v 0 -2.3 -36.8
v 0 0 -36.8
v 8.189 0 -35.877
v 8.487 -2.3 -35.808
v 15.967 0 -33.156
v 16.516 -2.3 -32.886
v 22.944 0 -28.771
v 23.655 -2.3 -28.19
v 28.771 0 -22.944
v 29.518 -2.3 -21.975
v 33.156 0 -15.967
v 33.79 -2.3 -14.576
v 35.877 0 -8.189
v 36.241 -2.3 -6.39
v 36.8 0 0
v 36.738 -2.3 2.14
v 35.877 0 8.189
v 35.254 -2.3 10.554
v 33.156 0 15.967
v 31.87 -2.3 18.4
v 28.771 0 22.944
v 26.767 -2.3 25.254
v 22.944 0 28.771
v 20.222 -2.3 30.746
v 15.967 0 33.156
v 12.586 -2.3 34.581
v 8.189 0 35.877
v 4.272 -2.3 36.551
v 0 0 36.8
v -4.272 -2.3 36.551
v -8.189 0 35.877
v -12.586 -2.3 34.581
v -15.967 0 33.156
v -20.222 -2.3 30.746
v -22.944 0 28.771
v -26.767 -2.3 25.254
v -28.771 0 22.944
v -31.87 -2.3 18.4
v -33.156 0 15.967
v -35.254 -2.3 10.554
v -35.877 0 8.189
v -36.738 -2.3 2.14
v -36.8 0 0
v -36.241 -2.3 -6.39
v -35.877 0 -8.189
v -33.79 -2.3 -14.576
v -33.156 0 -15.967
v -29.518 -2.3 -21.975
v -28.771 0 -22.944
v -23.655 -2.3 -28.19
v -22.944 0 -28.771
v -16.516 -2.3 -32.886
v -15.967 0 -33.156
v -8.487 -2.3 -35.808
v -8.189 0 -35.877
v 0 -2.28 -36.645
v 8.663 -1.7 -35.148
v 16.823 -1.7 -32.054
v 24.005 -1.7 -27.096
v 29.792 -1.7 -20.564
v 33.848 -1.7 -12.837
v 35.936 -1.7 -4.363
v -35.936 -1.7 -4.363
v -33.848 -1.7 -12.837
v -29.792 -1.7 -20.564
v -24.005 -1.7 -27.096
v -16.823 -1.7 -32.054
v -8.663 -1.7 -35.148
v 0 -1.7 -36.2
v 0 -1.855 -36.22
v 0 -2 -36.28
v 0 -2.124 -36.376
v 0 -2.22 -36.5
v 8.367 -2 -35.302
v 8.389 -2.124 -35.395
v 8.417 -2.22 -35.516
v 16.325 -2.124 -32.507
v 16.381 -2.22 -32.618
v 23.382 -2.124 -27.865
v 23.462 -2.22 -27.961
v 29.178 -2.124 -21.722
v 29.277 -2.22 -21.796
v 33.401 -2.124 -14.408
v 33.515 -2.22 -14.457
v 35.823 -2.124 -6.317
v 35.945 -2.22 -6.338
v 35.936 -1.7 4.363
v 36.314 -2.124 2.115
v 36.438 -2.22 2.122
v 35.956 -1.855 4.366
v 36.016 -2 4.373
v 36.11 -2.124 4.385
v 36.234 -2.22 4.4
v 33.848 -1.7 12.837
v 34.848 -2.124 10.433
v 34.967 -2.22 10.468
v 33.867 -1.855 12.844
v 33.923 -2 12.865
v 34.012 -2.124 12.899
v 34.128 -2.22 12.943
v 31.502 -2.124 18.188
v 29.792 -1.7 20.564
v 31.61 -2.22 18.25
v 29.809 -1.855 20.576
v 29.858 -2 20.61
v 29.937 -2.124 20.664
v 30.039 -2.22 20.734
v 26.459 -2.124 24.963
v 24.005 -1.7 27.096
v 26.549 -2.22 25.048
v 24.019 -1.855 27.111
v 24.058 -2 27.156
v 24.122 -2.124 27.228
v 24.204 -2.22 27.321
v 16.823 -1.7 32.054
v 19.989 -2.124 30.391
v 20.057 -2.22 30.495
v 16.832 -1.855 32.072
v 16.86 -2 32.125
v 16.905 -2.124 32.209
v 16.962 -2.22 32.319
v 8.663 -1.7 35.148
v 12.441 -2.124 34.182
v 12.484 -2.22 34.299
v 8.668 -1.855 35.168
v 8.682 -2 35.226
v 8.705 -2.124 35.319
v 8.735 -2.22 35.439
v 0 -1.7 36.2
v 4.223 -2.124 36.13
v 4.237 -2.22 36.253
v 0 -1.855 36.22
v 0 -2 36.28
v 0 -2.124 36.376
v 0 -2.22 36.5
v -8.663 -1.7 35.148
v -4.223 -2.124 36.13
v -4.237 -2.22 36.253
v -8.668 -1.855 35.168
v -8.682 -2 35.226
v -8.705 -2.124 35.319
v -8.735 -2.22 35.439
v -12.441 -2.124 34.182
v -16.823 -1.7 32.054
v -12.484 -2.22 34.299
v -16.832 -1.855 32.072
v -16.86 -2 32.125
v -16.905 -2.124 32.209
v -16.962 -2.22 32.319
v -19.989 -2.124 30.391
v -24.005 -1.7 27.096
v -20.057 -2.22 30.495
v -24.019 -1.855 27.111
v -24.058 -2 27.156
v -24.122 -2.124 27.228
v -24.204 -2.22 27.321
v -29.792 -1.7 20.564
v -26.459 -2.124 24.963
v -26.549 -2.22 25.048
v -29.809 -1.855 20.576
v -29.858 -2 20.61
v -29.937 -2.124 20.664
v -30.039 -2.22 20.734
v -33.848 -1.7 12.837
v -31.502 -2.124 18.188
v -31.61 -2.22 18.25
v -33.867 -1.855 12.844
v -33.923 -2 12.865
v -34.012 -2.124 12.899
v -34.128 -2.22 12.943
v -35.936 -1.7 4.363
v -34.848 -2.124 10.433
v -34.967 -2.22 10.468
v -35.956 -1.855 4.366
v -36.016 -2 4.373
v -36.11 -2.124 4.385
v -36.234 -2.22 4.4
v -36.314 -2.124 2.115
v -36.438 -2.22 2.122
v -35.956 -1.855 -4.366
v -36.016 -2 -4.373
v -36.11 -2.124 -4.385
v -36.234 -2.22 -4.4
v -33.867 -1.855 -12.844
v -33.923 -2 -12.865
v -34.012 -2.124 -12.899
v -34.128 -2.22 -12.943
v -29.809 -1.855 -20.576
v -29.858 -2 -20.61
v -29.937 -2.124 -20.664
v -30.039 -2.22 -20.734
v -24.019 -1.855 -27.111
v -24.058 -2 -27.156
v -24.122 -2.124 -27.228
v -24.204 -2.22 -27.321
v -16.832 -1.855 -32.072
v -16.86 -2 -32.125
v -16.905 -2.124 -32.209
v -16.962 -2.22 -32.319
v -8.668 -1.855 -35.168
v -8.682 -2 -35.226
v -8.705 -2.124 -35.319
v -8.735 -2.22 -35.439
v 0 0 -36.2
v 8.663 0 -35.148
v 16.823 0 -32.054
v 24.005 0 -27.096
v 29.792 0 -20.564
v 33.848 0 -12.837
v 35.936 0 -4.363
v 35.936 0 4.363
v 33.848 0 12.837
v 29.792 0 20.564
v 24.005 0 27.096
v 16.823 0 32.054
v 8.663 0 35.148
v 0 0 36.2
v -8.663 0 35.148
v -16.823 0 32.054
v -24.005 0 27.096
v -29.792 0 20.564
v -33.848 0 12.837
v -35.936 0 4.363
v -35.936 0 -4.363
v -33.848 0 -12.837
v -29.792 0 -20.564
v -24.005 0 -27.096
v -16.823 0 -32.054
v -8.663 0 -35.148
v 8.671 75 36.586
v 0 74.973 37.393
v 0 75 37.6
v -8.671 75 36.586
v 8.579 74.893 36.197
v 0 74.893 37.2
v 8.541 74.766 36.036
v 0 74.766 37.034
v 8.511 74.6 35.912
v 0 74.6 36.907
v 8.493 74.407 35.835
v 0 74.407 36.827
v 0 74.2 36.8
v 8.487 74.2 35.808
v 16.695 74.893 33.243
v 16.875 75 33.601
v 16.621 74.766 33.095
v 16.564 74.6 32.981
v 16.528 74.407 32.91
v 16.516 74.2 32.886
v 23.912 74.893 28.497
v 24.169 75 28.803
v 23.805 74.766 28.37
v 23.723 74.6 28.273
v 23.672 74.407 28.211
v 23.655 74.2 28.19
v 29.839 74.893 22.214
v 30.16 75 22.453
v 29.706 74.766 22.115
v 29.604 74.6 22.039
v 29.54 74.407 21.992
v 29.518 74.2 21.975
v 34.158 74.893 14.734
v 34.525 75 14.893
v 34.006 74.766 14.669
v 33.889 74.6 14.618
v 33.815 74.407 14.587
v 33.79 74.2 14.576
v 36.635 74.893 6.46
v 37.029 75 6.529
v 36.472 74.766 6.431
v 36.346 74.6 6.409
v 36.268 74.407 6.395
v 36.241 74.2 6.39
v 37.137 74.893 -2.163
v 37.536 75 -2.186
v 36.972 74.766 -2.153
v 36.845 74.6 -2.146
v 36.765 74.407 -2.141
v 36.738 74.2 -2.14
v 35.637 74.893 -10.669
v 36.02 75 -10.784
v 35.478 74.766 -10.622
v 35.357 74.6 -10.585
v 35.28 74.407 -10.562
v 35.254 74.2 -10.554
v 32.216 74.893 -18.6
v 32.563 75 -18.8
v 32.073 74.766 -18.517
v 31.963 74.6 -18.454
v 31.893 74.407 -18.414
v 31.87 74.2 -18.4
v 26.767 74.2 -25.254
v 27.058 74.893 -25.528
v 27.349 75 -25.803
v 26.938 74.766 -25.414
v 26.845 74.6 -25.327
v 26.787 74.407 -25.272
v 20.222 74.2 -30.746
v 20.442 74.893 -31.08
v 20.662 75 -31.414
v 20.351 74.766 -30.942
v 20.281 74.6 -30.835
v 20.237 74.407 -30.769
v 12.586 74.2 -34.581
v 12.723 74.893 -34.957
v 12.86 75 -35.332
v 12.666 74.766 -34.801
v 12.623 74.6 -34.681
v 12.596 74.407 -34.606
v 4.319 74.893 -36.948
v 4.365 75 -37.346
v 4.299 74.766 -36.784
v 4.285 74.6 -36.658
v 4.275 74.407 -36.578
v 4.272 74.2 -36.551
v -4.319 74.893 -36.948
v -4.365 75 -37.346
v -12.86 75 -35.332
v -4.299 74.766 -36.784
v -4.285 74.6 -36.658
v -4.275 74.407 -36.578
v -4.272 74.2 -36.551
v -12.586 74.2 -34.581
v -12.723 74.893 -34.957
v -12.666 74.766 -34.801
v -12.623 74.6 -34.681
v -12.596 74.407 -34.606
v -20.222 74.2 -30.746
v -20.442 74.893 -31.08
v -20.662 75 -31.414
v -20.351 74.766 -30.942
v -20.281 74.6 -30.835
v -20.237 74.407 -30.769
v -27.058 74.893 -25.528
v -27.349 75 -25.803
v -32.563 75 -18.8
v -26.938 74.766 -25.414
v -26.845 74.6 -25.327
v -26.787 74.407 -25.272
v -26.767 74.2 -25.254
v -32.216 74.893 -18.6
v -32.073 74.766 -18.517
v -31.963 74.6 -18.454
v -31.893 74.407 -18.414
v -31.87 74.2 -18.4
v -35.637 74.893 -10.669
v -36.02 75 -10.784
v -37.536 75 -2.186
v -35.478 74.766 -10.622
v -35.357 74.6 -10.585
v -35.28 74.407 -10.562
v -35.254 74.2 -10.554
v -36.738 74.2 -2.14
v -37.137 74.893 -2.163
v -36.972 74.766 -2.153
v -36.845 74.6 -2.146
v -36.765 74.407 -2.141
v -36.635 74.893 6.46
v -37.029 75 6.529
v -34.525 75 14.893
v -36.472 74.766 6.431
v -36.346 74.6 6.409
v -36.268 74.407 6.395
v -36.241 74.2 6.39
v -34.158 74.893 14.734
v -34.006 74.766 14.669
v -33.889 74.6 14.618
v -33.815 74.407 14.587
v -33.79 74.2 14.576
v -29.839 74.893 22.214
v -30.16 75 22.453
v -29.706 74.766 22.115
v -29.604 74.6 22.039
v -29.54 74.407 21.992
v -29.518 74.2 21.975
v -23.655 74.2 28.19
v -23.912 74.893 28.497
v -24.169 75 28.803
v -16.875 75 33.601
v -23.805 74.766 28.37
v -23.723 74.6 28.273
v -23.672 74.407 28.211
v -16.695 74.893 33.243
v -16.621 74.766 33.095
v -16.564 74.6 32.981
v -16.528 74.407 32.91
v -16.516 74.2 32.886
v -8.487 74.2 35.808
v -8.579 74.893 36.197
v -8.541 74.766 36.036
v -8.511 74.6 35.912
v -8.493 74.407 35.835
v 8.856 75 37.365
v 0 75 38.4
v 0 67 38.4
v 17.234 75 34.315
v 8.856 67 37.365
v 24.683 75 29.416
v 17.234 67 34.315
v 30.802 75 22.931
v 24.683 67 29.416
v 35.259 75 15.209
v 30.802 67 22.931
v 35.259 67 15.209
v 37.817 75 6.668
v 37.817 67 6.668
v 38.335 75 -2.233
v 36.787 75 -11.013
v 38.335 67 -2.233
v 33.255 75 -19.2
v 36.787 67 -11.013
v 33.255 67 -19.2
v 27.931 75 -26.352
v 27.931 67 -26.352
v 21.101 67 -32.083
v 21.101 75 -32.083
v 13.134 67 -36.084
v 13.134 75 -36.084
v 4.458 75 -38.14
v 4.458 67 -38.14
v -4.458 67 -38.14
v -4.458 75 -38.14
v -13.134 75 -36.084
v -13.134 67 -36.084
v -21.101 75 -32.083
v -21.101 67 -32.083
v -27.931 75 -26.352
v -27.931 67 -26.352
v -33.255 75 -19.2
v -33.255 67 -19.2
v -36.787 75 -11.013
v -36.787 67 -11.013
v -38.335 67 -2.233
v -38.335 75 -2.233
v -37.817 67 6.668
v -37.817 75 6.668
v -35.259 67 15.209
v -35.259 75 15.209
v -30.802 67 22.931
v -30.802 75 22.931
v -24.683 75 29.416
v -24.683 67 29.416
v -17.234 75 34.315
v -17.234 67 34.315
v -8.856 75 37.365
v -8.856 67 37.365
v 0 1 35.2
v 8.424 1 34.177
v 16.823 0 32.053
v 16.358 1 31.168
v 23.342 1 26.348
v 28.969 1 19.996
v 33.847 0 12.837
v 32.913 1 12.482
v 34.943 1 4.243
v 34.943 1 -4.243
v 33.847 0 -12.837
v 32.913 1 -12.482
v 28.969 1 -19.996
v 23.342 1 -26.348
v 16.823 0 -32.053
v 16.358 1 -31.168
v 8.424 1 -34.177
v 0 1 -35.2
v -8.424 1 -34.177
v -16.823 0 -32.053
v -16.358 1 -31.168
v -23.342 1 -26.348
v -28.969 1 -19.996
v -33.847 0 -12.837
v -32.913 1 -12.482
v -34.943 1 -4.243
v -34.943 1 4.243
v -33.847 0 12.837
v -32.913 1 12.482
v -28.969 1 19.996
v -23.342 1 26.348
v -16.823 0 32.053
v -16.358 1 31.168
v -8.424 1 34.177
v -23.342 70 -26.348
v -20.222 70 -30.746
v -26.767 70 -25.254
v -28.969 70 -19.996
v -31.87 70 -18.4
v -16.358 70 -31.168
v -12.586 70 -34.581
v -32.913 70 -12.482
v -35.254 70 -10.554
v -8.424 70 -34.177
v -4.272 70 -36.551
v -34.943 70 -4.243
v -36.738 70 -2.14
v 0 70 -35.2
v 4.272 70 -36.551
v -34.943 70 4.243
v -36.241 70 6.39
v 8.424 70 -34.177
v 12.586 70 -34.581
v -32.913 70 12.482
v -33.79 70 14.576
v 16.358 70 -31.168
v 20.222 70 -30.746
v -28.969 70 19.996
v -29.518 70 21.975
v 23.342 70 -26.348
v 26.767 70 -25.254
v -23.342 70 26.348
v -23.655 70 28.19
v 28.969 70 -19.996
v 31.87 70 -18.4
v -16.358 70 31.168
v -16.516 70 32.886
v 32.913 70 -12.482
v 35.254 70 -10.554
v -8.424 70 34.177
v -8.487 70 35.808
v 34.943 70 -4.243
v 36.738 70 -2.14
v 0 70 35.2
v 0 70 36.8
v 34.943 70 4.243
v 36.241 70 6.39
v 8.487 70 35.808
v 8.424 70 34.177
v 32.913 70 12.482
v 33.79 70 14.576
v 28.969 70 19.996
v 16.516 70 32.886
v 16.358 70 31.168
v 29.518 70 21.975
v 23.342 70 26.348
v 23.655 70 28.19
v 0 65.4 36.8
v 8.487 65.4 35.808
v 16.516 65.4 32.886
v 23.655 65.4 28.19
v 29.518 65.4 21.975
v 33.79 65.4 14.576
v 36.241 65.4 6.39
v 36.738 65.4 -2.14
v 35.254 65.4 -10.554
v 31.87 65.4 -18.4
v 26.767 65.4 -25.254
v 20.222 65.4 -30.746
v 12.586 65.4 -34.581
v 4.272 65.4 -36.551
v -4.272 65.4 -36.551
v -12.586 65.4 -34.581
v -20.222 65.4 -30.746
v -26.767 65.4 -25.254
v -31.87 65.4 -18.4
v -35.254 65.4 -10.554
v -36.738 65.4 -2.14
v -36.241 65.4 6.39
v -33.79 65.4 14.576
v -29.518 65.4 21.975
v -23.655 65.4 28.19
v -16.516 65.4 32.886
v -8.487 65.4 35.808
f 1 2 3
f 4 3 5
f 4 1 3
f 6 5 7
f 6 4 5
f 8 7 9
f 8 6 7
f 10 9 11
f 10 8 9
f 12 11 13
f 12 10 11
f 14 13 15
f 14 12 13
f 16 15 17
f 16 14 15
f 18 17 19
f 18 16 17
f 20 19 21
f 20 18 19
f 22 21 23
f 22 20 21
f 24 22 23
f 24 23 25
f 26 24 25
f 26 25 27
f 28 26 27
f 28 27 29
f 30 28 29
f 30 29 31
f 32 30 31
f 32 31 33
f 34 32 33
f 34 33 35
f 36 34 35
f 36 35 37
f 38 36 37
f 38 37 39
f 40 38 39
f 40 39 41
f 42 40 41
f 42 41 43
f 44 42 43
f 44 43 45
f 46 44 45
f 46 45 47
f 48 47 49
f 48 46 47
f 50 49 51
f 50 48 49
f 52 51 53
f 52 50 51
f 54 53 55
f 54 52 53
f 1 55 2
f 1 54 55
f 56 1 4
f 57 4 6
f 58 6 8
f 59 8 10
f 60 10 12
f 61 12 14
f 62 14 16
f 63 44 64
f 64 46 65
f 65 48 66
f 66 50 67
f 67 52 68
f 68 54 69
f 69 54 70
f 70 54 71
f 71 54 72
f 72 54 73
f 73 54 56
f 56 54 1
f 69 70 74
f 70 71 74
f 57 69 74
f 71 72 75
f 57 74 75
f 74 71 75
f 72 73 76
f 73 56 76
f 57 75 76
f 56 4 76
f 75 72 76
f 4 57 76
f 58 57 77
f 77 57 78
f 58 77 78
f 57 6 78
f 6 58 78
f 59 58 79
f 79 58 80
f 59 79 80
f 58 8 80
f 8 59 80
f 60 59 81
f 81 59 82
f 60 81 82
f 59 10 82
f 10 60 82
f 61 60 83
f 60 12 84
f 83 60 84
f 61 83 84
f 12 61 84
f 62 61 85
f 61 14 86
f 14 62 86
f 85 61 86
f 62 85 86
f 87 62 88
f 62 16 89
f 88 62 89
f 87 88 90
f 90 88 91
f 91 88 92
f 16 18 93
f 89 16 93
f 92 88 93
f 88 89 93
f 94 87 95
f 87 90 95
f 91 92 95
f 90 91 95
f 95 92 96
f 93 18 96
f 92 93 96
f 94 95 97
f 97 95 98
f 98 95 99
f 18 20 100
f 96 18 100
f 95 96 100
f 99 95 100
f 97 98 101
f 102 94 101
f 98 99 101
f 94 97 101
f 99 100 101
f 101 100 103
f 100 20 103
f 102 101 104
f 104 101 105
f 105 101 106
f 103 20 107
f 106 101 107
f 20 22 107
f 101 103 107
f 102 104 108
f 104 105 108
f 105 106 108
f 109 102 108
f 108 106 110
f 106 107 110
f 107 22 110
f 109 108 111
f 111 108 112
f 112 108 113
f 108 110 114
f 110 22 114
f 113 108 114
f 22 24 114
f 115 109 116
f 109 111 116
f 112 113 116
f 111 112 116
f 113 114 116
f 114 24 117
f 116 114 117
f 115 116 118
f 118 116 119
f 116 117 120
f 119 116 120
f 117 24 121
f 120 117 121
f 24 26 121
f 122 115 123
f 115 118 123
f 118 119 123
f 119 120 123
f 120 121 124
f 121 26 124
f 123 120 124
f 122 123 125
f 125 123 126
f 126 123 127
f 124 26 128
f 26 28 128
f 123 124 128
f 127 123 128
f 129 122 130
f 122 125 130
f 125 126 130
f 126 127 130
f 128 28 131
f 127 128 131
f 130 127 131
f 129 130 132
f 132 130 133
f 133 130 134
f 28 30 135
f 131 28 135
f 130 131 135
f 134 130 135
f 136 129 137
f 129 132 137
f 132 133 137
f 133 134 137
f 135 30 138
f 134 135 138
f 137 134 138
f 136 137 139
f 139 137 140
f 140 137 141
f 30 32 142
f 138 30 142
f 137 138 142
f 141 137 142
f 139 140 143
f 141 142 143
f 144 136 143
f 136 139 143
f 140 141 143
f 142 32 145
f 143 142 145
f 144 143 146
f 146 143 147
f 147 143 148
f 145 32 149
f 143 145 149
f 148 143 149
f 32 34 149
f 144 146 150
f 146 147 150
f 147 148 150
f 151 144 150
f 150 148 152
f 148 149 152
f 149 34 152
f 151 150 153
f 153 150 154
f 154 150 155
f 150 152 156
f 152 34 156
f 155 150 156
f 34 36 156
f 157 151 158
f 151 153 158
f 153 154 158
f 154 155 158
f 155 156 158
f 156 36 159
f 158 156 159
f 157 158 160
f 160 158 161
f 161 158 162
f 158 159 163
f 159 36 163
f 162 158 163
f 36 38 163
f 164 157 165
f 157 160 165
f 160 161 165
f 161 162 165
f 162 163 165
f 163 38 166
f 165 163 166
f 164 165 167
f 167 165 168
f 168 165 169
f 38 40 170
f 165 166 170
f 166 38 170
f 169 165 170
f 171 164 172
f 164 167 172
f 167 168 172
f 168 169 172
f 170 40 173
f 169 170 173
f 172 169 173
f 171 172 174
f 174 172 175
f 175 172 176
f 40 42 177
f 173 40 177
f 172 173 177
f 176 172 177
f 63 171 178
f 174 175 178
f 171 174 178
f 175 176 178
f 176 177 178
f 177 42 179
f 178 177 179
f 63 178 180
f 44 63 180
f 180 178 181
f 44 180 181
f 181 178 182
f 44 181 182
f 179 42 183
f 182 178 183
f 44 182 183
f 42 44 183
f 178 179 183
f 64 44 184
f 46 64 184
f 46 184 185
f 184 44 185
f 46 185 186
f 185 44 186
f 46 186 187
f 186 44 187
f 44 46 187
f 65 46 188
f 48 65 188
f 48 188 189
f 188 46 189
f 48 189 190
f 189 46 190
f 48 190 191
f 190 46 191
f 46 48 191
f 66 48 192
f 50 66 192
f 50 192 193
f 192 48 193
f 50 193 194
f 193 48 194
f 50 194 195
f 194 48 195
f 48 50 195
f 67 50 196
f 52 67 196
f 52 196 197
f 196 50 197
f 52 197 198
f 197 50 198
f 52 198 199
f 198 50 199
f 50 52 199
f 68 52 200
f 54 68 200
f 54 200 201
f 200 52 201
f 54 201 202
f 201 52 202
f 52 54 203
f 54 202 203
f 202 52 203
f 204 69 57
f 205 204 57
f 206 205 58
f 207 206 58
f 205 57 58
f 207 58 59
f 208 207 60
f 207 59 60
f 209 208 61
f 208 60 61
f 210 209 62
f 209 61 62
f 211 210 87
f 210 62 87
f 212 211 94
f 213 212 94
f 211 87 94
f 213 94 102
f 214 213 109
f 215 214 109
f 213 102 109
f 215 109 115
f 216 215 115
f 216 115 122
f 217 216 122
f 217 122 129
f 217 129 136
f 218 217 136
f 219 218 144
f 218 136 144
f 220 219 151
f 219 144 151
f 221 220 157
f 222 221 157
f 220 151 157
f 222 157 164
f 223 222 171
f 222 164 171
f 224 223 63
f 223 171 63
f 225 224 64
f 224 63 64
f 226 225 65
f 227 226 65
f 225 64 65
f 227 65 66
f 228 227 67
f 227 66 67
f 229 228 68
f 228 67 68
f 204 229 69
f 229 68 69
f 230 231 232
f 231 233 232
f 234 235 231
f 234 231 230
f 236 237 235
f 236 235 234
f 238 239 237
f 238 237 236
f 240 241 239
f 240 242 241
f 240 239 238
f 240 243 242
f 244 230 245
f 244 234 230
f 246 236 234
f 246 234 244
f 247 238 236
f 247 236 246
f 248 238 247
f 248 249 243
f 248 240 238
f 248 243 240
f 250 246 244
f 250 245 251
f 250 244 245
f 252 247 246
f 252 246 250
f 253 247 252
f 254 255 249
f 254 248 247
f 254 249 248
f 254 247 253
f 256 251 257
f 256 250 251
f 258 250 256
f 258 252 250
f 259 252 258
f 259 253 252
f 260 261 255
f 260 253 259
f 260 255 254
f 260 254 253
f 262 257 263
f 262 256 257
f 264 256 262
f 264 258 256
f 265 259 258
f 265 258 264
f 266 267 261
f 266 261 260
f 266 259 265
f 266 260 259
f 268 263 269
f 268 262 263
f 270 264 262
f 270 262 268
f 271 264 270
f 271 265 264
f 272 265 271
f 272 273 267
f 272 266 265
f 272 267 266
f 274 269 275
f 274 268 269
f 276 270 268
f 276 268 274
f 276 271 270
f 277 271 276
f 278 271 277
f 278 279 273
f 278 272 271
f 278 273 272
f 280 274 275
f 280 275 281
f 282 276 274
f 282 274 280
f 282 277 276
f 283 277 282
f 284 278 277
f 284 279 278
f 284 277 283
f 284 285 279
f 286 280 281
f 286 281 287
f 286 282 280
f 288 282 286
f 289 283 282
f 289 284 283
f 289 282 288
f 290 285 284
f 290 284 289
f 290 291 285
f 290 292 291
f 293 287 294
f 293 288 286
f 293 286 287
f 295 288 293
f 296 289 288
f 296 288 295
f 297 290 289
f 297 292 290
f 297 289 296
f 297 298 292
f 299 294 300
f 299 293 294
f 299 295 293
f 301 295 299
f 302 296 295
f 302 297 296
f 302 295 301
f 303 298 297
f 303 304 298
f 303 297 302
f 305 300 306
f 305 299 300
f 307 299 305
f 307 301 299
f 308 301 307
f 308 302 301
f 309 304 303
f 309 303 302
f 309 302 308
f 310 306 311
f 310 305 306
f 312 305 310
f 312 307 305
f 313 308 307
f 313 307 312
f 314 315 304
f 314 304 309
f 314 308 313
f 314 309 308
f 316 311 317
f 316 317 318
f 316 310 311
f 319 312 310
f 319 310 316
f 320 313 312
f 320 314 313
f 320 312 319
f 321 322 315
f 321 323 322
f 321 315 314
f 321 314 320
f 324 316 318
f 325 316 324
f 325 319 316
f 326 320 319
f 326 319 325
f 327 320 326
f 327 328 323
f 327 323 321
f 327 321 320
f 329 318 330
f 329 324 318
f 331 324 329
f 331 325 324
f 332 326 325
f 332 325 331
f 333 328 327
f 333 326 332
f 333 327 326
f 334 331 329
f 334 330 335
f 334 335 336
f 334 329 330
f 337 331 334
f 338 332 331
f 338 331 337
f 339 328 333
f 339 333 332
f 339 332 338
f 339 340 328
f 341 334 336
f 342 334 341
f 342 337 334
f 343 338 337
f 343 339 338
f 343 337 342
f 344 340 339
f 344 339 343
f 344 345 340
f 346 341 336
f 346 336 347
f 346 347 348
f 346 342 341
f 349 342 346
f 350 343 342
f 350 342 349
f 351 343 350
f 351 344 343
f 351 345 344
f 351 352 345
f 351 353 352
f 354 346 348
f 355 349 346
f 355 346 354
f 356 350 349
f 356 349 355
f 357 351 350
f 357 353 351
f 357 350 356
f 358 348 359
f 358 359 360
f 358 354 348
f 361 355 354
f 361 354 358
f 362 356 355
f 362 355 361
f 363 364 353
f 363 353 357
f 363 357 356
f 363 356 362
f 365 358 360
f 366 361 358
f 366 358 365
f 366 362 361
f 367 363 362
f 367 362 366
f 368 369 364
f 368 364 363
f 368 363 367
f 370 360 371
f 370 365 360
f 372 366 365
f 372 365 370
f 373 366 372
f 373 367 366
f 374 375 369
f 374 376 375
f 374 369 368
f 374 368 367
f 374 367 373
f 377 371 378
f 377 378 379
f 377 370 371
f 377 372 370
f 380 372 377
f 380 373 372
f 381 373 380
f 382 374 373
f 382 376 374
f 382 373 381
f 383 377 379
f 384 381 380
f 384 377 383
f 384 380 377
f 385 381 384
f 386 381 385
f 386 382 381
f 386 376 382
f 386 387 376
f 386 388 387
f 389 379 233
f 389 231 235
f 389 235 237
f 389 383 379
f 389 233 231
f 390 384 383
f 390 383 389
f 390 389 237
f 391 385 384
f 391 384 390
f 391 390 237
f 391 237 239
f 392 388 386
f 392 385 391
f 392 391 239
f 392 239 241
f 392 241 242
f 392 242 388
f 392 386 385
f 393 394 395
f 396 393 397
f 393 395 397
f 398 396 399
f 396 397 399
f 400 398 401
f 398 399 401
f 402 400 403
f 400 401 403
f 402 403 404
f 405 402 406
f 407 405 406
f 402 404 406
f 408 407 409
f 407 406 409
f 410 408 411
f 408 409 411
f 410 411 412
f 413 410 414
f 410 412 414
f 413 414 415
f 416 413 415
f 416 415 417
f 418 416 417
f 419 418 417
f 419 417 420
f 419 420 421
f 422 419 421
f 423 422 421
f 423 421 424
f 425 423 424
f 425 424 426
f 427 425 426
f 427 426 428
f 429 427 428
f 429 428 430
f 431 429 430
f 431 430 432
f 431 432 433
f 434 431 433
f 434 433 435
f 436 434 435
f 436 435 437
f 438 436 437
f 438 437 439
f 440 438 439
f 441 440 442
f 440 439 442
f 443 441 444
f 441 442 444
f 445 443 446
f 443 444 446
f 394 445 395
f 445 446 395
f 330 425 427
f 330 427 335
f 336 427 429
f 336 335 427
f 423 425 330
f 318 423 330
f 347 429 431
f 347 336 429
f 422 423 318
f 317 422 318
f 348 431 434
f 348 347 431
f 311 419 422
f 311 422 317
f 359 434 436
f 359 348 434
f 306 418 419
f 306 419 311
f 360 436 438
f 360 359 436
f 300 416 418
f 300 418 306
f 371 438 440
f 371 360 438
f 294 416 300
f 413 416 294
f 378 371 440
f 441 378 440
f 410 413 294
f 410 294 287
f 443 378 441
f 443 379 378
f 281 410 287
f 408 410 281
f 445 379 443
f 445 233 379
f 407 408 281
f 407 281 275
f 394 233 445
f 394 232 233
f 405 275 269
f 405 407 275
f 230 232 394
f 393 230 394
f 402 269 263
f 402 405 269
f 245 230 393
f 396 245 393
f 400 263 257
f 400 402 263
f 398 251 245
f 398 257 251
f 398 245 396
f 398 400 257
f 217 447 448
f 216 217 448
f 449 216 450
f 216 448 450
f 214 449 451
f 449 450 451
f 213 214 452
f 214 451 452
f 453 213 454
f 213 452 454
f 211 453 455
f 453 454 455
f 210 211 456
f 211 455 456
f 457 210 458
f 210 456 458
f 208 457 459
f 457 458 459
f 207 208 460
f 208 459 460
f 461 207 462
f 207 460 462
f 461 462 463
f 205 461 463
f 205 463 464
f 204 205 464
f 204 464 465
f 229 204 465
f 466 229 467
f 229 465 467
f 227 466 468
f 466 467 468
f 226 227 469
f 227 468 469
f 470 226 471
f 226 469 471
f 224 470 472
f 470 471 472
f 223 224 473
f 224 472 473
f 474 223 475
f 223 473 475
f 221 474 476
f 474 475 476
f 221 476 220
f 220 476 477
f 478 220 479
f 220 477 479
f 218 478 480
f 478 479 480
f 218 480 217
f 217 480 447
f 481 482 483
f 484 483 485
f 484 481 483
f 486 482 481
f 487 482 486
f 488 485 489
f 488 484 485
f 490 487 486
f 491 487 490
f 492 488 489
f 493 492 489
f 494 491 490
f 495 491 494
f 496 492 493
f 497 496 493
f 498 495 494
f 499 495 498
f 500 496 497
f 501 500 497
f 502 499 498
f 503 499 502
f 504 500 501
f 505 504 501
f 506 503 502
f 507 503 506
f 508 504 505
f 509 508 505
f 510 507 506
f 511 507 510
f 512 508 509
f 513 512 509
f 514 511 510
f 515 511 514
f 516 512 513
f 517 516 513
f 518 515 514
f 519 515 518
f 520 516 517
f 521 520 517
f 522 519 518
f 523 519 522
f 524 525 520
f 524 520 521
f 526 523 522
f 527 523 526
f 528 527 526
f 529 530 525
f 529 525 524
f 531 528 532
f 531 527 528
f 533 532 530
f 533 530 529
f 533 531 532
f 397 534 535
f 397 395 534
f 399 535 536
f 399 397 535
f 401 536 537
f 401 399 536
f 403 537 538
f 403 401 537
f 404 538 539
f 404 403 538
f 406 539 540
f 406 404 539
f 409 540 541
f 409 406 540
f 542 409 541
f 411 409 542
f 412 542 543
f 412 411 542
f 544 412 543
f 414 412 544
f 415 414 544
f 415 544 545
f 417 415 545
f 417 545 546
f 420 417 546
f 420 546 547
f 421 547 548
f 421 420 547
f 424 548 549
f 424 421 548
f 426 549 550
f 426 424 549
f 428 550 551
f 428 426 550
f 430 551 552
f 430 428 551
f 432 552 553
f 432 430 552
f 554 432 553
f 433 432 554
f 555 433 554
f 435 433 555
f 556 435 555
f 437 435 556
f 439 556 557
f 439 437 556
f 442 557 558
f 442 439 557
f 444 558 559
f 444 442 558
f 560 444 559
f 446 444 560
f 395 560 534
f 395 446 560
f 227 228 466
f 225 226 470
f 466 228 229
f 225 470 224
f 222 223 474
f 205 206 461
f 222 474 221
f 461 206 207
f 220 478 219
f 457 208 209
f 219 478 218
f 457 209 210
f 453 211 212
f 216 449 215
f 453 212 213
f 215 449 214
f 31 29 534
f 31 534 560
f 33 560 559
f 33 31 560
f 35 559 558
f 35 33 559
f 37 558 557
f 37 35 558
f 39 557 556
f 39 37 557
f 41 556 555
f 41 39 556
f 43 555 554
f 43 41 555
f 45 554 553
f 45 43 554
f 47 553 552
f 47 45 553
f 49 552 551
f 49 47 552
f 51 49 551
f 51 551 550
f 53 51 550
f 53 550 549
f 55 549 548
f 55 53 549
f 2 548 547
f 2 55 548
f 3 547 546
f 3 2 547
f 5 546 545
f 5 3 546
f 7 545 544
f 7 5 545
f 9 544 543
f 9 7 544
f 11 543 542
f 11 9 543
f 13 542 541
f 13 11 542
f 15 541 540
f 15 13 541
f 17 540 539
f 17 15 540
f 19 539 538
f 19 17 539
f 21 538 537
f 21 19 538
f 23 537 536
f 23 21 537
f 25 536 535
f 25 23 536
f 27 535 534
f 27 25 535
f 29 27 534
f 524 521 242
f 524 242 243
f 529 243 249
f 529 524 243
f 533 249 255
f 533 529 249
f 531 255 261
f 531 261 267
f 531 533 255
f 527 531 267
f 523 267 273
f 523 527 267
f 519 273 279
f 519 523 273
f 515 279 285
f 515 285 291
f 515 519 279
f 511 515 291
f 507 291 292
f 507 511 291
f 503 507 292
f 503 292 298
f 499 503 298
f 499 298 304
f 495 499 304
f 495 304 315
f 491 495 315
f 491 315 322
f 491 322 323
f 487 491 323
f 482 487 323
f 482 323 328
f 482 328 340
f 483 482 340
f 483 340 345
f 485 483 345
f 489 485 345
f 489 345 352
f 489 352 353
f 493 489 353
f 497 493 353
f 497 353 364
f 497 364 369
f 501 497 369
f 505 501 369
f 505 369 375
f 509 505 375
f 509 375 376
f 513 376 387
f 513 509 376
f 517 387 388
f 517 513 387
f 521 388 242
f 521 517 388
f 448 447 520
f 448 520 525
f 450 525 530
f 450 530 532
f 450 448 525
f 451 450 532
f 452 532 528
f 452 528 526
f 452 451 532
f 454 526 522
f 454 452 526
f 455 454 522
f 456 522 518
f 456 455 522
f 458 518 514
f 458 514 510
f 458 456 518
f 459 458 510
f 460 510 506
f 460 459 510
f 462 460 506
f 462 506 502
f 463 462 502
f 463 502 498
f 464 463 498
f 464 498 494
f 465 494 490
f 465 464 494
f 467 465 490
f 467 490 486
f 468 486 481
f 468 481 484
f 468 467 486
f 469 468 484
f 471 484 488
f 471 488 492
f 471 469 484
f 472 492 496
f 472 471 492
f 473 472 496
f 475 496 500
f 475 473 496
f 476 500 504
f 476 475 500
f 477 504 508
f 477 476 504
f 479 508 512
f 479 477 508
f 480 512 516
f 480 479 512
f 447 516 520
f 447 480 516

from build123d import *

# Parameters (mm, degrees)
SKETCH1_R                = 36.8
SKETCH1_R_2              = 35.2
BOSS_EXTRUDE1_DEPTH      = 70
BOSS_EXTRUDE2_DEPTH      = 5
BOSS_EXTRUDE2_DEPTH_BACK = 5
SKETCH2_R                = 38.4
SKETCH2_R_2              = 36.8
CHAMFER1_SIZE            = 2
FILLET1_R                = 0.8
BOSS_EXTRUDE3_START      = 2.3
SKETCH3_R                = 36.8
SKETCH3_R_2              = 36.2
BOSS_EXTRUDE3_DEPTH      = 2.3
CHAMFER2_SIZE            = 1
FILLET2_R                = 0.6


# Some blends are built 0.0001 mm under size
with BuildPart() as part:
    # Sketch1 → Boss-Extrude1 (new body)
    with BuildSketch(Plane(origin=(0, 0, 0), x_dir=(1, 0, 0), z_dir=(0, 1, 0))):
        with Locations(Location((0, 0, 0), (0, 0, 270))):
            Circle(SKETCH1_R)
        with Locations(Location((0, 0, 0), (0, 0, 270))):
            Circle(SKETCH1_R_2, mode=Mode.SUBTRACT)
    extrude(amount=BOSS_EXTRUDE1_DEPTH)

    # Sketch2 → Boss-Extrude2 (add, two sides: drawn at the far end of the back side and taken through both)
    with BuildSketch(Plane(origin=(0, 70, 0), x_dir=(1, 0, 0), z_dir=(0, 1, 0)).offset(-BOSS_EXTRUDE2_DEPTH_BACK)):
        with Locations(Location((0, 0, 0), (0, 0, 270))):
            Circle(SKETCH2_R)
        with Locations(Location((0, 0, 0), (0, 0, 270))):
            Circle(SKETCH2_R_2, mode=Mode.SUBTRACT)
    extrude(amount=BOSS_EXTRUDE2_DEPTH + BOSS_EXTRUDE2_DEPTH_BACK)

    # Chamfer1
    # the kernel refuses this chamfer: 2 mm, written as the material it takes off along each edge
    with BuildSketch(Plane(origin=(0, 65, 0), x_dir=(0, 0, 1), z_dir=(-1, 0, 0))) as chamfer1_piece_1_section:
        Polygon((38.4 - CHAMFER1_SIZE, 0), (38.4, CHAMFER1_SIZE), (38.4, 0), align=None)
    chamfer1_piece_1 = revolve(axis=Axis((0, 65, 0), (0, 1, 0)), mode=Mode.PRIVATE)
    chamfer1_piece_1 = chamfer1_piece_1 - Plane(origin=(0, 66.172330508, 0), x_dir=(0, 0, 1), z_dir=(0, -1, 0)) * Cylinder(36.8, 154, mode=Mode.PRIVATE)
    add(chamfer1_piece_1, mode=Mode.SUBTRACT)

    # Fillet1
    fillet1_edges = [part.edges().sort_by_distance(p)[0] for p in [
        (0, 75, -36.8),
    ]]
    fillet(fillet1_edges, radius=FILLET1_R)

    # Sketch3 → Boss-Extrude3 (add)
    with BuildSketch(Plane.XZ.offset(BOSS_EXTRUDE3_START)):
        with Locations(Location((0, 0, 0), (0, 0, 270))):
            Circle(SKETCH3_R)
        with Locations(Location((0, 0, 0), (0, 0, 270))):
            Circle(SKETCH3_R_2, mode=Mode.SUBTRACT)
    extrude(amount=-BOSS_EXTRUDE3_DEPTH)

    # Chamfer2
    chamfer2_edges = [part.edges().sort_by_distance(p)[0] for p in [
        (0, 0, -35.2),
    ]]
    chamfer(chamfer2_edges, length=CHAMFER2_SIZE - 0.0001)  # a hair under: the kernel refuses the full size

    # Fillet2
    fillet2_edges = [part.edges().sort_by_distance(p)[0] for p in [
        (0, -2.3, 36.2),
    ]]
    fillet(fillet2_edges, radius=FILLET2_R - 0.0001)  # a hair under: the kernel refuses the full size


solid = part.part
